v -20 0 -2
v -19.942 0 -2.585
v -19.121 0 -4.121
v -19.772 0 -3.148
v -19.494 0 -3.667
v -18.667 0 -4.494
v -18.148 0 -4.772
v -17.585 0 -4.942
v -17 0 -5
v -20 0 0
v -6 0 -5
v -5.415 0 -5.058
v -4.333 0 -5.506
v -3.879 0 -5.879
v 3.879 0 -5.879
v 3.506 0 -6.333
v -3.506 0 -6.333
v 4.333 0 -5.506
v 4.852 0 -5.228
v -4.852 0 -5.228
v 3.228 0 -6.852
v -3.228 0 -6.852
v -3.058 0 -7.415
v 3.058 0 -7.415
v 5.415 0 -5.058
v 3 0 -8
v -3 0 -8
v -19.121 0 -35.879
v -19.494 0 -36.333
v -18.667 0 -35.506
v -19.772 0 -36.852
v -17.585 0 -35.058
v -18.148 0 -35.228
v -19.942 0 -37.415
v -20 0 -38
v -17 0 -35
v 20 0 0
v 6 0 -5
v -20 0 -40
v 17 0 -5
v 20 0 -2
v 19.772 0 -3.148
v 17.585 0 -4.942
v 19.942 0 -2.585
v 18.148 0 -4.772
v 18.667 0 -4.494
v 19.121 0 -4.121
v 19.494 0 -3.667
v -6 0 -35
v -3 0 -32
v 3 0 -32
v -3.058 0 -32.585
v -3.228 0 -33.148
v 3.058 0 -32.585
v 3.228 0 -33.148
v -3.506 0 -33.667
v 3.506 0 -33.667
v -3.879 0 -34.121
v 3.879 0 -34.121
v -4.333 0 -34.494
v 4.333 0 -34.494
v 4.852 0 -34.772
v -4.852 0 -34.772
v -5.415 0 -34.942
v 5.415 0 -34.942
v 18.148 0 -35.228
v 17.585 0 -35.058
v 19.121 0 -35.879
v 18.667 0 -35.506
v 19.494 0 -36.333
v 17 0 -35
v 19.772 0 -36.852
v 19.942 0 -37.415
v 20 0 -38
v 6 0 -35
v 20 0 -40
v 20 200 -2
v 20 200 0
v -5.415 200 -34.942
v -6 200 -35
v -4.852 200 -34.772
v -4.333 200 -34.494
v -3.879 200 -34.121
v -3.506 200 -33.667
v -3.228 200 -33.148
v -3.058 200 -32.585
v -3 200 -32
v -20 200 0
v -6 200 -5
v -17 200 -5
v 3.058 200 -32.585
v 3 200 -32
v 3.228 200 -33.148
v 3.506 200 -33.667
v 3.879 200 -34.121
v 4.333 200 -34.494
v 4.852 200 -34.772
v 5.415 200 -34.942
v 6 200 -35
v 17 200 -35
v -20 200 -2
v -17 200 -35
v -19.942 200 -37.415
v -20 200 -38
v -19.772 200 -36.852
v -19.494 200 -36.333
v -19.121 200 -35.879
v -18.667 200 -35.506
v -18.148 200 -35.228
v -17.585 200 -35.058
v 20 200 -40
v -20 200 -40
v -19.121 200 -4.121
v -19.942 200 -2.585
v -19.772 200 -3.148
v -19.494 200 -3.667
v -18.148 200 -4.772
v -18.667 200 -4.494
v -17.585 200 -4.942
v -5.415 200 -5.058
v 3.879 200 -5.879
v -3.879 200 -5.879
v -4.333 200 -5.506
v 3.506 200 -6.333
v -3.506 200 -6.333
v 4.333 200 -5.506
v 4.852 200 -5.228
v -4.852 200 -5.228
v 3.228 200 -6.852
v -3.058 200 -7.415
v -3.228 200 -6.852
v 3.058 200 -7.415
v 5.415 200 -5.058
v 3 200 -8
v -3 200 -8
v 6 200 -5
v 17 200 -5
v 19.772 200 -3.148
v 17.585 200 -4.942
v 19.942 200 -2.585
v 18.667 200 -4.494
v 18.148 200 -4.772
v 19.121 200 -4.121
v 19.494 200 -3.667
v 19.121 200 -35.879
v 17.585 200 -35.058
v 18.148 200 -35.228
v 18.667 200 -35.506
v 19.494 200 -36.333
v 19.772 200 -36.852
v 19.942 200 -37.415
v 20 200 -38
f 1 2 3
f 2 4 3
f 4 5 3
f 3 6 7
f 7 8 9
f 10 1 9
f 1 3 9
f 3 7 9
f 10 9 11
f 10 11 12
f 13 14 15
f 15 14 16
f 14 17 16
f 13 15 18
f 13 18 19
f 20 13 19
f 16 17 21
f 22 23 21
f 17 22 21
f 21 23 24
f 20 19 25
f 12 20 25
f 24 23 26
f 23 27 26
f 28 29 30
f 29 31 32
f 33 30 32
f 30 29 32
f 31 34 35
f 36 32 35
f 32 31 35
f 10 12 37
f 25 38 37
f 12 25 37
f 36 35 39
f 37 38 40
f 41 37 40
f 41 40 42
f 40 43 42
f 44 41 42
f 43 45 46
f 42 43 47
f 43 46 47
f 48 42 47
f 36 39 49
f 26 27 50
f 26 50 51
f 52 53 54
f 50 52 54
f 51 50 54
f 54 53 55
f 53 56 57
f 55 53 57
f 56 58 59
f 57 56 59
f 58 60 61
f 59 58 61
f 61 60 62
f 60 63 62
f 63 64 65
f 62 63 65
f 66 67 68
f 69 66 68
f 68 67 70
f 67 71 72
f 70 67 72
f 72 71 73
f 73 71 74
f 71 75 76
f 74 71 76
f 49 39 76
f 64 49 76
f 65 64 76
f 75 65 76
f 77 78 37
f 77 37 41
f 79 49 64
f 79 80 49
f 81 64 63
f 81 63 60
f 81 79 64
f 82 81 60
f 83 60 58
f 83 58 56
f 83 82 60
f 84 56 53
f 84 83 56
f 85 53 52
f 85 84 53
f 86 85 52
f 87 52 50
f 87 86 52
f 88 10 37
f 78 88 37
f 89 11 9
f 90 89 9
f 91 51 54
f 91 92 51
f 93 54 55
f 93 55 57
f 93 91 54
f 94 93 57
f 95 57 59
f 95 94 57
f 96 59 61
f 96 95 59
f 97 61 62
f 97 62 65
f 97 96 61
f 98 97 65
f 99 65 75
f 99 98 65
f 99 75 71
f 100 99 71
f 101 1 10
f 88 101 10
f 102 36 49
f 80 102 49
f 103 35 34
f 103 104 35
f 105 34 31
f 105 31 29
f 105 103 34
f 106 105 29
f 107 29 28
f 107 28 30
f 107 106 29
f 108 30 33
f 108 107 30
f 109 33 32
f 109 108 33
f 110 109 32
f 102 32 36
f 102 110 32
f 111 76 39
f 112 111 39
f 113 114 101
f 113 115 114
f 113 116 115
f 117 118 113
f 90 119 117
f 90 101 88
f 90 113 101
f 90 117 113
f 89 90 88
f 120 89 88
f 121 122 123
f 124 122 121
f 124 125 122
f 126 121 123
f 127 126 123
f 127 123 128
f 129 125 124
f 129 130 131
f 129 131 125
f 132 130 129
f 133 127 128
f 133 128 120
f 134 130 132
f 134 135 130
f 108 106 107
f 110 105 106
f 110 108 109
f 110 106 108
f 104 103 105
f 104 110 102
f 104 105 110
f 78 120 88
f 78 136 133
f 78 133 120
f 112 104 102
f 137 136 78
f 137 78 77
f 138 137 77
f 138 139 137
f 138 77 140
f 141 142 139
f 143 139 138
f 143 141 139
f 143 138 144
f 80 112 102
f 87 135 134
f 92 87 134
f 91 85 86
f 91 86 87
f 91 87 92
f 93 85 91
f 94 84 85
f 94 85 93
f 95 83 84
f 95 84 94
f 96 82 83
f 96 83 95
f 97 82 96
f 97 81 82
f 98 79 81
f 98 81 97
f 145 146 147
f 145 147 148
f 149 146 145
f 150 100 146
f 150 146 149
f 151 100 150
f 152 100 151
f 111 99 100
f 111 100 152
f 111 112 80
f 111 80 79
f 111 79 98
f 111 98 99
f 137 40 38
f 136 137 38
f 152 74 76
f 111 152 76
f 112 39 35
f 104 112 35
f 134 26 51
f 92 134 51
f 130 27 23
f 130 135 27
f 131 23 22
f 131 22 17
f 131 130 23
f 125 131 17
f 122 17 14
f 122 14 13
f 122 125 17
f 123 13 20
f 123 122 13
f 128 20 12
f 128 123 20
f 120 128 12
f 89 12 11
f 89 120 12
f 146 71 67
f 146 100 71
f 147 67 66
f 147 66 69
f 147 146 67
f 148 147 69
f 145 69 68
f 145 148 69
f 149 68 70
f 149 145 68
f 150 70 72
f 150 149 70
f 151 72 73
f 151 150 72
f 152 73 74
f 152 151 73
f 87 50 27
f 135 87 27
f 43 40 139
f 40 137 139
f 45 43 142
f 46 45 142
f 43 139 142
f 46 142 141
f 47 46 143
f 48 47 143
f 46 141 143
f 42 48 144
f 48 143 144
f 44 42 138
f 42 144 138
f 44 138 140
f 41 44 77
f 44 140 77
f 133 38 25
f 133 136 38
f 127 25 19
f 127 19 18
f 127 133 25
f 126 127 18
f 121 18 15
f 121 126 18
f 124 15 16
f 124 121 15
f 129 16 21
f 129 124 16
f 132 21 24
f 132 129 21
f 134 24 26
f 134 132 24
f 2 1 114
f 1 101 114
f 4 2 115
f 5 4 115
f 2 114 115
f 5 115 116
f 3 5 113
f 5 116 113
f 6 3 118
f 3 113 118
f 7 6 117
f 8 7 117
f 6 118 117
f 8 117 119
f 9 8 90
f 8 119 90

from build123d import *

# Parameters (mm, degrees)
BOSS_EXTRUDE1_DEPTH = 200
FILLET1_R           = 3
FILLET2_R           = 3


with BuildPart() as part:
    # Sketch1 → Boss-Extrude1 (new body)
    with BuildSketch(Plane(origin=(0, 0, 0), x_dir=(1, 0, 0), z_dir=(0, 1, 0))):
        Polygon((-20, 5), (-20, 0), (0, 0), (0, 40), (-20, 40), (-20, 35), (-3, 35), (-3, 5), align=None)
        Polygon((0, 40), (0, 0), (20, 0), (20, 5), (3, 5), (3, 35), (20, 35), (20, 40), align=None)
    extrude(amount=BOSS_EXTRUDE1_DEPTH)

    # Fillet1
    fillet1_edges = [part.edges().sort_by_distance(p)[0] for p in [
        (-3, 100, -5),
        (-3, 100, -35),
        (3, 100, -35),
        (3, 100, -5),
    ]]
    fillet(fillet1_edges, radius=FILLET1_R)

    # Fillet2
    fillet2_edges = [part.edges().sort_by_distance(p)[0] for p in [
        (-20, 100, -5),
        (-20, 100, -35),
        (20, 100, -35),
        (20, 100, -5),
    ]]
    fillet(fillet2_edges, radius=FILLET2_R)


solid = part.part
